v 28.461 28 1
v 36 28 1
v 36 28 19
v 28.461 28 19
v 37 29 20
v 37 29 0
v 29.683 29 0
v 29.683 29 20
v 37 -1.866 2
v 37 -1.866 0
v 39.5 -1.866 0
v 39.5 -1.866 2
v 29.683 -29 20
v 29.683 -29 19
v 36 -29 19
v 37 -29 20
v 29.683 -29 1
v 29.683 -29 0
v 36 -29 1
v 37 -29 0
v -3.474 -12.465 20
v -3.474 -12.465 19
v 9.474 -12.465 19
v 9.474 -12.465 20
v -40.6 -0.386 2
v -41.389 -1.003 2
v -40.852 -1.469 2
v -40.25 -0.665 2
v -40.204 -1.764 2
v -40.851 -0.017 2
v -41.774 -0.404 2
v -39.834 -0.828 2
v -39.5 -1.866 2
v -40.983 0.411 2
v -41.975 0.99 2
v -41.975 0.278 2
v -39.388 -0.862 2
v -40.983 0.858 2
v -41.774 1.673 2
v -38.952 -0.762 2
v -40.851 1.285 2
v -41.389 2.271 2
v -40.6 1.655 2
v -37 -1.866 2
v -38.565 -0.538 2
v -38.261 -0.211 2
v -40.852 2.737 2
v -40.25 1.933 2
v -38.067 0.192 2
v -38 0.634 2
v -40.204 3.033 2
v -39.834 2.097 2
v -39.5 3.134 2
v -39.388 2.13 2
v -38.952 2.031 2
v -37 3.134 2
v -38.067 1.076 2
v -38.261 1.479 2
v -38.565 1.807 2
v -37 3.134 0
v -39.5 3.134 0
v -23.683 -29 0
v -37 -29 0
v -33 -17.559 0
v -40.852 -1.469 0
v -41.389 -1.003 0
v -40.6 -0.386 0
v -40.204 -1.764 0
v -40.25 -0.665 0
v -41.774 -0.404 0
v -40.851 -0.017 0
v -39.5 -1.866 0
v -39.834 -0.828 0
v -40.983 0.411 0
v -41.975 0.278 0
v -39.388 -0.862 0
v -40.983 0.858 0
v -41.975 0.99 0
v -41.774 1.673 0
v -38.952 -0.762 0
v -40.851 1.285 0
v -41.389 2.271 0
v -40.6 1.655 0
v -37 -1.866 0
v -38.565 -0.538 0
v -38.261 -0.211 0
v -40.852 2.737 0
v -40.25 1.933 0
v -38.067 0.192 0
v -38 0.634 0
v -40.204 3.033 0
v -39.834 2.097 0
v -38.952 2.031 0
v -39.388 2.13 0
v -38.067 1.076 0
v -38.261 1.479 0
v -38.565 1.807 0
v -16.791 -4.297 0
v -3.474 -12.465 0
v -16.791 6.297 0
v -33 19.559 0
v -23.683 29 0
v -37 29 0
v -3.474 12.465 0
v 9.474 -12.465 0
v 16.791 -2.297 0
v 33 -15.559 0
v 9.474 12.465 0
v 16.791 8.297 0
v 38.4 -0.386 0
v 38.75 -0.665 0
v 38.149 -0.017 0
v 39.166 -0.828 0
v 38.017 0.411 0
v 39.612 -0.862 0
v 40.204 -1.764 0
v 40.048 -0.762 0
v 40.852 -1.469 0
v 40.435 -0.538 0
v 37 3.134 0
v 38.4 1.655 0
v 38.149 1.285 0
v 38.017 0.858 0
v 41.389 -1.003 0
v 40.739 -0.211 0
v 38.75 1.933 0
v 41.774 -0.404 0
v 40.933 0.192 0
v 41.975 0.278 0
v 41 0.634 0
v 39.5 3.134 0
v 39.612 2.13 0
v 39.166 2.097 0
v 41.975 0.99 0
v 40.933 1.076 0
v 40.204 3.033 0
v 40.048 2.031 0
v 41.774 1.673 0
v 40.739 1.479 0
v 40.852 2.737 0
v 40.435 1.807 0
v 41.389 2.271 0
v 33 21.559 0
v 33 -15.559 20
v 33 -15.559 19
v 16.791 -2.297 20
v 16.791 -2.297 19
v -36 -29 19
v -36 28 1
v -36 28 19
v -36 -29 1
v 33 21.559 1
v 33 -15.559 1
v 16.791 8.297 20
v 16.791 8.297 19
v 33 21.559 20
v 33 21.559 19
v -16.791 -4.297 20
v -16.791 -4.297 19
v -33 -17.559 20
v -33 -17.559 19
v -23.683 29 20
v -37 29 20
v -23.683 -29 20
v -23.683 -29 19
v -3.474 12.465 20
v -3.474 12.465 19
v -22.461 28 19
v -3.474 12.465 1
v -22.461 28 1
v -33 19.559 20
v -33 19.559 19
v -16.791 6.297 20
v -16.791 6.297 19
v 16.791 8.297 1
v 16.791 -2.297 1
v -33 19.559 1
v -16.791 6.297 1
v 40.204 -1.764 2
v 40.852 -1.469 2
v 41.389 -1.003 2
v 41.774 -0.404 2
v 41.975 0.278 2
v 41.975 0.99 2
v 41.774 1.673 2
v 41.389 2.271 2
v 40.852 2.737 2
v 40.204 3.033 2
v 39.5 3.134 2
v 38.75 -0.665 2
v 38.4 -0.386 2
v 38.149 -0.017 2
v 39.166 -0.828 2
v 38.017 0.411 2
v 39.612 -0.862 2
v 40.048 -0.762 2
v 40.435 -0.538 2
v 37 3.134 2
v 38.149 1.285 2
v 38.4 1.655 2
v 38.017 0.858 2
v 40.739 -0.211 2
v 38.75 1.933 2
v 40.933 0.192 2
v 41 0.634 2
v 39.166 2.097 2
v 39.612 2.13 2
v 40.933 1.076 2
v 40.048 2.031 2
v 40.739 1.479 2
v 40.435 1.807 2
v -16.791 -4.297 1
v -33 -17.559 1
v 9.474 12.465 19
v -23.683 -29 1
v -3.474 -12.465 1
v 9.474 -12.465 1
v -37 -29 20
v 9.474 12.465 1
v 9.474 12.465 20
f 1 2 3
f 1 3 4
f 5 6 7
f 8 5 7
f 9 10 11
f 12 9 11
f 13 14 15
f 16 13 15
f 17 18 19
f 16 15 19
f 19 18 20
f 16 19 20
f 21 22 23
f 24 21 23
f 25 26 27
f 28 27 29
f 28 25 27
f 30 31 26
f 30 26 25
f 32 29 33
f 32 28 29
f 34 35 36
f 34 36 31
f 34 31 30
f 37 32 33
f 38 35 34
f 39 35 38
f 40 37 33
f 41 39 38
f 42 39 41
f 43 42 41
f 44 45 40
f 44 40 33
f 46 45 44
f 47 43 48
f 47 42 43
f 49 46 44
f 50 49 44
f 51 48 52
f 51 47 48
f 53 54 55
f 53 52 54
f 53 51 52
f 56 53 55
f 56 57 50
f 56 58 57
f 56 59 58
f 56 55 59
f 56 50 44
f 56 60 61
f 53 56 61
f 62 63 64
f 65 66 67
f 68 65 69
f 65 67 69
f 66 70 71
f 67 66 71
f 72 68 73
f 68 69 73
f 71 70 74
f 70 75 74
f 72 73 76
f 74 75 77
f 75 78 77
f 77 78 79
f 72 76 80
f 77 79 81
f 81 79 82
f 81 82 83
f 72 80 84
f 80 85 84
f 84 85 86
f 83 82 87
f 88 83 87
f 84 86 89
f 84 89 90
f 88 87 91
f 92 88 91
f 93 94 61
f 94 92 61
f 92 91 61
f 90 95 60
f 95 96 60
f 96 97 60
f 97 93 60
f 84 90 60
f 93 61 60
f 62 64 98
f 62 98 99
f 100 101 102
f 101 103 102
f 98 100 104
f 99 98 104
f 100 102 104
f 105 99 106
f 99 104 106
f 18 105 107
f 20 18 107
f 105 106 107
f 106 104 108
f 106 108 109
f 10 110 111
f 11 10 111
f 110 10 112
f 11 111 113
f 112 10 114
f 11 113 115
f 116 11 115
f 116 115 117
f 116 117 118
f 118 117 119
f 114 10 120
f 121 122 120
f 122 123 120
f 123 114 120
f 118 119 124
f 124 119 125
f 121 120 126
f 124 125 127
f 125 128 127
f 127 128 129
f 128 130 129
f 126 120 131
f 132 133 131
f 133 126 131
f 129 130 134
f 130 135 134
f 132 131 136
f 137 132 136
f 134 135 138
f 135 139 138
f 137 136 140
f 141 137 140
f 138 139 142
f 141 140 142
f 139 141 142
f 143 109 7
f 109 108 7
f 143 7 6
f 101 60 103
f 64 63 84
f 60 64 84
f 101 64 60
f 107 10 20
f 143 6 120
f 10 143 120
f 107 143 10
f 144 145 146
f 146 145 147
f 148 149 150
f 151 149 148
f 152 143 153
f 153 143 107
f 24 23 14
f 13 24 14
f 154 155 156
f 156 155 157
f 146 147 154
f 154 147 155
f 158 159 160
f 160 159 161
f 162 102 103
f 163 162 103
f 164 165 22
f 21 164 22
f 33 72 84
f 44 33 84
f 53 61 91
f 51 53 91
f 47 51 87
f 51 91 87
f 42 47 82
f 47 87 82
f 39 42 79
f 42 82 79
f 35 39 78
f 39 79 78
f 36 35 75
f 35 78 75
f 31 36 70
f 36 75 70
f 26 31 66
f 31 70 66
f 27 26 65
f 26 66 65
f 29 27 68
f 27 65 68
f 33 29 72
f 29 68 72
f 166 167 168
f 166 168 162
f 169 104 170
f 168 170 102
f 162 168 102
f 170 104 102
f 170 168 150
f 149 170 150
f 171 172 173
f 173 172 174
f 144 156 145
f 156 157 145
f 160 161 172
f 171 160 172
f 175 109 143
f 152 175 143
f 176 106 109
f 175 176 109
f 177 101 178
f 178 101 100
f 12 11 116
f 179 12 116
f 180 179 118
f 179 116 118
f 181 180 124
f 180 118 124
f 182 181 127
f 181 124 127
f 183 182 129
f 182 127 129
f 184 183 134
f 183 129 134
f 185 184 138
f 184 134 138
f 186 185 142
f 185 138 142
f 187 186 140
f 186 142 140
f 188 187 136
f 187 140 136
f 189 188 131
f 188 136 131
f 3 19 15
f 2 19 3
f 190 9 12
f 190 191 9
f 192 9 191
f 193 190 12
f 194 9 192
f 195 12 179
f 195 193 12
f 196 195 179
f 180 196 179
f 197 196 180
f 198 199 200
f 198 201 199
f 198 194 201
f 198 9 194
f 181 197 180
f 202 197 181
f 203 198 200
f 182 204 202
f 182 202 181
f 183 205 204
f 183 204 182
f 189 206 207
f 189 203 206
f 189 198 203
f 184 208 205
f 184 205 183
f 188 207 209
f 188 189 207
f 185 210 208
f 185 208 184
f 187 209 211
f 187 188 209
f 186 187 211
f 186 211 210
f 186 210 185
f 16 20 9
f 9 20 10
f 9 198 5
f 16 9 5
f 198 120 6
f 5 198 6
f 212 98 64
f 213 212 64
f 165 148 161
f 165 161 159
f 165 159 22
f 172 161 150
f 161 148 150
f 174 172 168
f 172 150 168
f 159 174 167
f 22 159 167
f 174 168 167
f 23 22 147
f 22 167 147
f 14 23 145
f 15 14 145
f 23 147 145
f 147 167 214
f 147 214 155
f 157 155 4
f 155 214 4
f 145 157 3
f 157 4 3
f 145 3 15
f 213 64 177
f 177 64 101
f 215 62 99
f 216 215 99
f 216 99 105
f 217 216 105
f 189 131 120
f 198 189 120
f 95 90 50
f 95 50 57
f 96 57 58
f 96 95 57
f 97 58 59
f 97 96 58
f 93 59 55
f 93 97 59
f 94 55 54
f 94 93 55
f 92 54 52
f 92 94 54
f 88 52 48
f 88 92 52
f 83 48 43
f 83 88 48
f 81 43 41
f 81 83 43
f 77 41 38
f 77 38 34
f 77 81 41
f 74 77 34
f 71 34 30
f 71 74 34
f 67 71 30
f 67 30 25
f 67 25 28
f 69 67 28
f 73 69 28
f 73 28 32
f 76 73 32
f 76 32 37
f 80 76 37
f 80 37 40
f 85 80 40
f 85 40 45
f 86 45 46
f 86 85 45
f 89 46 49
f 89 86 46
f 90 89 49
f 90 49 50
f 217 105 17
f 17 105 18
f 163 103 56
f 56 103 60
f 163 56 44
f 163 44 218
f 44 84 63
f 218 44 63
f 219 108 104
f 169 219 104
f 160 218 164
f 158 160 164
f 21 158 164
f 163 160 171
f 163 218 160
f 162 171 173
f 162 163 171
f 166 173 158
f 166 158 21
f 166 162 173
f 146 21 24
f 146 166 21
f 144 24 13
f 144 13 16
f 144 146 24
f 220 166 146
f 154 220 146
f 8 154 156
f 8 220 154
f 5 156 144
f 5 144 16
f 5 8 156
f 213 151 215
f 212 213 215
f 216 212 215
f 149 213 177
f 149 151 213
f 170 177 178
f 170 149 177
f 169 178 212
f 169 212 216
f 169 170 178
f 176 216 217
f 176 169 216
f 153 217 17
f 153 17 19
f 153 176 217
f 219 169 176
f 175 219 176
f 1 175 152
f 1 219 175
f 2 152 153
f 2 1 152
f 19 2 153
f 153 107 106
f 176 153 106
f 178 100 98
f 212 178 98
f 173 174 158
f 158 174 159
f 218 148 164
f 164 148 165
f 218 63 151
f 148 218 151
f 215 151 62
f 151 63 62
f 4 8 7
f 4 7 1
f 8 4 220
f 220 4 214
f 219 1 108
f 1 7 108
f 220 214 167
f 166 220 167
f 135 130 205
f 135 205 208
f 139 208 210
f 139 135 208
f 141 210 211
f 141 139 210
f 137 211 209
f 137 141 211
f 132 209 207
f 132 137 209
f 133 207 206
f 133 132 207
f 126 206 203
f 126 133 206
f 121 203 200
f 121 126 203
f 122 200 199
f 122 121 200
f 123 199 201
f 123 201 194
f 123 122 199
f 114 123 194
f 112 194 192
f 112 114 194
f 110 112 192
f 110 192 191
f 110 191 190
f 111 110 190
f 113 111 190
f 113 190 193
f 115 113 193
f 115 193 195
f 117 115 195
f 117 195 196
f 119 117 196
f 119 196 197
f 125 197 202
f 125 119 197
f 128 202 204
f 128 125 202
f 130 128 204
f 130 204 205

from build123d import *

# Parameters (mm, degrees)
BOSS_EXTRUDE2_DEPTH = 20
SHELL2_T            = -1
SKETCH2_R           = 1.5
BOSS_EXTRUDE4_DEPTH = 2


with BuildPart() as part:
    # Sketch1 → Boss-Extrude2 (new body)
    with BuildSketch(Plane.XY):
        Polygon((-3.474068414, 12.465208849), (-23.683257598, 29), (-37, 29), (-37, -29), (-23.683257598, -29), (-3.474068414, -12.465208849), (9.474068414, -12.465208849), (29.683257598, -29), (37, -29), (37, 29), (29.683257598, 29), (9.474068414, 12.465208849), align=None)
        Polygon((-33, 19.559028944), (-16.790810816, 6.296965066), (-16.790810816, -4.296965066), (-33, -17.559028944), align=None, mode=Mode.SUBTRACT)
        Polygon((16.790810816, 8.296965066), (33, 21.559028944), (33, -15.559028944), (16.790810816, -2.296965066), align=None, mode=Mode.SUBTRACT)
    extrude(amount=BOSS_EXTRUDE2_DEPTH)

    # Shell2
    shell2_openings = [part.faces().sort_by_distance(p)[0] for p in [
        (24.895405408, -8.927997005, 10),
        (33, 3, 10),
        (24.895405408, 14.927997005, 10),
        (16.790810816, 3, 10),
        (-16.790810816, 1, 10),
        (-24.895405408, 12.927997005, 10),
        (-33, 1, 10),
        (-24.895405408, -10.927997005, 10),
        (33.341628799, -29, 10),
        (19.578663006, -20.732604425, 10),
        (3, -12.465208849, 10),
        (-13.578663006, -20.732604425, 10),
        (-30.341628799, -29, 10),
        (-13.578663006, 20.732604425, 10),
        (3, 12.465208849, 10),
        (19.578663006, 20.732604425, 10),
    ]]
    offset(amount=SHELL2_T, openings=shell2_openings, kind=Kind.INTERSECTION)

    # Sketch2 → Boss-Extrude4 (add)
    with BuildSketch(Plane.XY):
        with BuildLine():
            Line((-39.5, -1.865744817), (-37, -1.865744817))
            Line((-37, -1.865744817), (-37, 3.134255183))
            Line((-37, 3.134255183), (-39.5, 3.134255183))
            ThreePointArc((-39.5, 3.134255183), (-42, 0.634255183), (-39.5, -1.865744817))
        make_face()
        with Locations((-39.5, 0.634255183)):
            Circle(SKETCH2_R, mode=Mode.SUBTRACT)
        with BuildLine():
            Line((39.5, 3.134255183), (37, 3.134255183))
            Line((37, 3.134255183), (37, -1.865744817))
            Line((37, -1.865744817), (39.5, -1.865744817))
            ThreePointArc((39.5, -1.865744817), (42, 0.634255183), (39.5, 3.134255183))
        make_face()
        with Locations((39.5, 0.634255183)):
            Circle(SKETCH2_R, mode=Mode.SUBTRACT)
    extrude(amount=BOSS_EXTRUDE4_DEPTH)


solid = part.part
